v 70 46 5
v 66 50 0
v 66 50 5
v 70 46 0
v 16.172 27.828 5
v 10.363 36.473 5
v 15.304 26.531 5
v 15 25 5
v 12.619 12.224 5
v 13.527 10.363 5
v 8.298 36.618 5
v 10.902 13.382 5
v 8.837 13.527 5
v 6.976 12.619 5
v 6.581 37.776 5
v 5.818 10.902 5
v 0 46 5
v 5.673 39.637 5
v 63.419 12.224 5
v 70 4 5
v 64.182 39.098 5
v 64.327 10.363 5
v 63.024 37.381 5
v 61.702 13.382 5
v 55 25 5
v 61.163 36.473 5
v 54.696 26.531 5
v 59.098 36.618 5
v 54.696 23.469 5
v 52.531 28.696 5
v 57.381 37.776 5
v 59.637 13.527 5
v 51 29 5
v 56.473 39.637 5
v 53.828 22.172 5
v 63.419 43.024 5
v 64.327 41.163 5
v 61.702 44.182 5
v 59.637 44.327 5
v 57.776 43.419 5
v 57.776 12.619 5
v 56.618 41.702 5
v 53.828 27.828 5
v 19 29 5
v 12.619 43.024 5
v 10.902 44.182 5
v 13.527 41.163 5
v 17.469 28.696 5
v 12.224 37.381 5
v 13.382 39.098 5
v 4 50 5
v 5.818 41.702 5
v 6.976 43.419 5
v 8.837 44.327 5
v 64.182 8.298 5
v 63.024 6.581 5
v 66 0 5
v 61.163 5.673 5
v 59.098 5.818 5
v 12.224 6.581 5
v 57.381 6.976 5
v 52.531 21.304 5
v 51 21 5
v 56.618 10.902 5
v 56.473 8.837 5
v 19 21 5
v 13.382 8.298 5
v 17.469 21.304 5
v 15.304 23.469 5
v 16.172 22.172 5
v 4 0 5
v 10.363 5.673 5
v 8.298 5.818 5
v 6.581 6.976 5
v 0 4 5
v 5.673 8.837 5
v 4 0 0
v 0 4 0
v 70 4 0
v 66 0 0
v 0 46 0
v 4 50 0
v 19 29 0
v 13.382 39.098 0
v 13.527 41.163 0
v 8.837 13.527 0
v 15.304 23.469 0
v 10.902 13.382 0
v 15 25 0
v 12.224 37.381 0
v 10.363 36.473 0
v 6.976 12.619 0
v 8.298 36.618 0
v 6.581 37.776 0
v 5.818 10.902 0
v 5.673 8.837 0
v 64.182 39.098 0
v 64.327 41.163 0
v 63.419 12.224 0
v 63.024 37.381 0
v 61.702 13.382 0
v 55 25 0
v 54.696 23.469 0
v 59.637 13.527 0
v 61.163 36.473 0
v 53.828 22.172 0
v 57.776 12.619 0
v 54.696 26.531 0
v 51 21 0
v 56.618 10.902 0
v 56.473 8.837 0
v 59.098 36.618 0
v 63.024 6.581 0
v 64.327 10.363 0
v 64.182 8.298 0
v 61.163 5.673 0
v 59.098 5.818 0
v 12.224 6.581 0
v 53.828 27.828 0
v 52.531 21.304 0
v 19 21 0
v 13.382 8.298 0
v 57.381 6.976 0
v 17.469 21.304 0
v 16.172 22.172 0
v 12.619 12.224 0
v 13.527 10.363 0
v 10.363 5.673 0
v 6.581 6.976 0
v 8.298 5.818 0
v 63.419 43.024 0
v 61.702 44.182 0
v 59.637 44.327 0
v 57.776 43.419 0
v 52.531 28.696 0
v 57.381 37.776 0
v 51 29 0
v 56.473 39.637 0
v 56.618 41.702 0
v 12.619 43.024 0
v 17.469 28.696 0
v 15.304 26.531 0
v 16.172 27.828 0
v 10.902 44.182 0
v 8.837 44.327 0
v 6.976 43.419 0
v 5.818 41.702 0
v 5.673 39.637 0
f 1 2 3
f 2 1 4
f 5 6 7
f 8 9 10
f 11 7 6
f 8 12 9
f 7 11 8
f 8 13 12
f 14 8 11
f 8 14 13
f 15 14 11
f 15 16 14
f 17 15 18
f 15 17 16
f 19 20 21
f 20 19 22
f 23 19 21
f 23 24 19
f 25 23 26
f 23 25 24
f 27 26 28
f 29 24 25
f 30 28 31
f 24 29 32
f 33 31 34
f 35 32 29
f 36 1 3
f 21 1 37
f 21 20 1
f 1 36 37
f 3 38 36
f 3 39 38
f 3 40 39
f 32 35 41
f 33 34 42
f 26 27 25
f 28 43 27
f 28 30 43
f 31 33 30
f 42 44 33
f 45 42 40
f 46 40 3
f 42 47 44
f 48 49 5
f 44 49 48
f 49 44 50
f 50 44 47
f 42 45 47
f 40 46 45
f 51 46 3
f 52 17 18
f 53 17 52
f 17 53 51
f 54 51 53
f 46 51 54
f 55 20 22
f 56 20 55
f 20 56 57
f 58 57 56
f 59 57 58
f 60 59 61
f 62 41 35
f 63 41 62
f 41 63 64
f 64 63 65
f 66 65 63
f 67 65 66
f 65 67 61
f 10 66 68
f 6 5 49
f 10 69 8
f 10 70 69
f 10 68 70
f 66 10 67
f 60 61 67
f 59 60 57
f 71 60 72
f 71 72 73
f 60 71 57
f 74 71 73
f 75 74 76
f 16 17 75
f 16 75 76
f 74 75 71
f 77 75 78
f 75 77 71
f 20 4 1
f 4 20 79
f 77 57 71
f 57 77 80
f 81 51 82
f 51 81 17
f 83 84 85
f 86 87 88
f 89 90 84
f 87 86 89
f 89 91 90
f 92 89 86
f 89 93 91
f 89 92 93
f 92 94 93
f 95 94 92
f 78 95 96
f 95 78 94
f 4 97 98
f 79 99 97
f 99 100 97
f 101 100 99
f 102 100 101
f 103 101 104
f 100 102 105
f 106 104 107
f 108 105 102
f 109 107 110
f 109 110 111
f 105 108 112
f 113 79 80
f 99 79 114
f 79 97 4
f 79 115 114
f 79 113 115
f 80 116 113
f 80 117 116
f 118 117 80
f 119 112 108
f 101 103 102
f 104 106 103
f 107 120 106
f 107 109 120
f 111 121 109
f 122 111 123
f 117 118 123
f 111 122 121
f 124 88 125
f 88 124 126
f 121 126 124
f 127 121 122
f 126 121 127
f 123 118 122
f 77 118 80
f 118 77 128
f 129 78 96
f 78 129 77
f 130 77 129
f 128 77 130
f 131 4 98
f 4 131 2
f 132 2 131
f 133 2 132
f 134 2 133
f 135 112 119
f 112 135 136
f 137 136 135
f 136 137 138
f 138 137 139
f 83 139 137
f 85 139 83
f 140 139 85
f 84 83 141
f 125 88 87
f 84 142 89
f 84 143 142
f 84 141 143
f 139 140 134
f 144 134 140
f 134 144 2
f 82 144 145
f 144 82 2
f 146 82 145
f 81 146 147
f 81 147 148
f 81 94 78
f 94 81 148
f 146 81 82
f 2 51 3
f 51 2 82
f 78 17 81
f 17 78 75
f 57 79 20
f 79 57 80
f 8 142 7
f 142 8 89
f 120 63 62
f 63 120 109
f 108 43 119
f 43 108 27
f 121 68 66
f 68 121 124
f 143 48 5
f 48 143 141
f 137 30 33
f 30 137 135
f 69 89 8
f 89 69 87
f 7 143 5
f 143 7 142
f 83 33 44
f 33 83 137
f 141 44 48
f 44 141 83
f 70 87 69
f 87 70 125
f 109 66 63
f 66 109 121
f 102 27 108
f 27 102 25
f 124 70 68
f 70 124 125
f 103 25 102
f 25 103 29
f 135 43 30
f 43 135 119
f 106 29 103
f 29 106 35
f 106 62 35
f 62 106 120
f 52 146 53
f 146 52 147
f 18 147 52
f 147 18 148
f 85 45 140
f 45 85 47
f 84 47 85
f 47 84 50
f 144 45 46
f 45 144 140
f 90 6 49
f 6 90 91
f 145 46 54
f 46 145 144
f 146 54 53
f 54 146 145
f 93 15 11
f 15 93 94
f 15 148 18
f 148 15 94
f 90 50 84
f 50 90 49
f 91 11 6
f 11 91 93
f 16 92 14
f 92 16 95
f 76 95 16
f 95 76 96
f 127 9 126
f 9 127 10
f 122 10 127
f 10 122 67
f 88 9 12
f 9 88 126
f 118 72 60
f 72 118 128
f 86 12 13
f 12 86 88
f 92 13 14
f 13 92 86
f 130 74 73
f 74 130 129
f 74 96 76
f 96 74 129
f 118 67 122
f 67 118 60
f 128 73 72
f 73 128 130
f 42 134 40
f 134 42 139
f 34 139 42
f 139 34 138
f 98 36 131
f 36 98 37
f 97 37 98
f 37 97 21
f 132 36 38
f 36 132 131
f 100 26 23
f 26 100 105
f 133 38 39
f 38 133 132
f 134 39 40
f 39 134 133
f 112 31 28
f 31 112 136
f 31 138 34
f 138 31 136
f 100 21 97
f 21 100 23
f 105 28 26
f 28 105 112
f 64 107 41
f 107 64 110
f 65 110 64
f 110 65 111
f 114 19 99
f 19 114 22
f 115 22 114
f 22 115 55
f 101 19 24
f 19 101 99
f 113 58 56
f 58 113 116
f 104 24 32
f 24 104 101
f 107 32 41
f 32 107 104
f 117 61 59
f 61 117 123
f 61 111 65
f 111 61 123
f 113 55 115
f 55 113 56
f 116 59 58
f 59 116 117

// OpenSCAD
$fn = 32;

// ----------------------------------------------------------------------
// Bracket plate: slot plate 70 x 50
// ----------------------------------------------------------------------

// --- parameters (mm) ---
hole_r = 4;               // bolt hole radius
plate_t = 5;              // plate thickness, Z (extrusion height)
plate_l = 70;             // plate length
plate_w = 50;             // plate width
slot_l = 32;              // slot straight length
slot_r = 4;               // slot end radius

slot_len = slot_l + 2 * slot_r;
slot_w = 2 * slot_r;
hole_d2 = 2 * hole_r;

profile = [[4, 0], [66, 0], [70, 4], [70, 46], [66, 50], [4, 50], [0, 46], [0, 4]];  // primary outline, 8 points, counter clockwise
void_1 = [[51, 21], [52.531, 21.304], [53.828, 22.172], [54.696, 23.469], [55, 25], [54.696, 26.531], [53.828, 27.828], [52.531, 28.696], [51, 29], [19, 29], [17.469, 28.696], [16.172, 27.828], [15.304, 26.531], [15, 25], [15.304, 23.469], [16.172, 22.172], [17.469, 21.304], [19, 21]];  // grip slot, 18 points
void_2 = [[13.527, 41.163], [12.619, 43.024], [10.902, 44.182], [8.837, 44.327], [6.976, 43.419], [5.818, 41.702], [5.673, 39.637], [6.581, 37.776], [8.298, 36.618], [10.363, 36.473], [12.224, 37.381], [13.382, 39.098]];  // corner hole, 12 points
void_3 = [[13.527, 10.363], [12.619, 12.224], [10.902, 13.382], [8.837, 13.527], [6.976, 12.619], [5.818, 10.902], [5.673, 8.837], [6.581, 6.976], [8.298, 5.818], [10.363, 5.673], [12.224, 6.581], [13.382, 8.298]];  // corner hole, 12 points
void_4 = [[64.327, 41.163], [63.419, 43.024], [61.702, 44.182], [59.637, 44.327], [57.776, 43.419], [56.618, 41.702], [56.473, 39.637], [57.381, 37.776], [59.098, 36.618], [61.163, 36.473], [63.024, 37.381], [64.182, 39.098]];  // corner hole, 12 points
void_5 = [[64.327, 10.363], [63.419, 12.224], [61.702, 13.382], [59.637, 13.527], [57.776, 12.619], [56.618, 10.902], [56.473, 8.837], [57.381, 6.976], [59.098, 5.818], [61.163, 5.673], [63.024, 6.581], [64.182, 8.298]];  // corner hole, 12 points

// --- the one profile operation ---
difference() {
  linear_extrude(height = plate_t) polygon(points = profile);
  translate([0, 0, -1])
    linear_extrude(height = plate_t + 2) polygon(points = void_1);
  translate([0, 0, -1])
    linear_extrude(height = plate_t + 2) polygon(points = void_2);
  translate([0, 0, -1])
    linear_extrude(height = plate_t + 2) polygon(points = void_3);
  translate([0, 0, -1])
    linear_extrude(height = plate_t + 2) polygon(points = void_4);
  translate([0, 0, -1])
    linear_extrude(height = plate_t + 2) polygon(points = void_5);
}
